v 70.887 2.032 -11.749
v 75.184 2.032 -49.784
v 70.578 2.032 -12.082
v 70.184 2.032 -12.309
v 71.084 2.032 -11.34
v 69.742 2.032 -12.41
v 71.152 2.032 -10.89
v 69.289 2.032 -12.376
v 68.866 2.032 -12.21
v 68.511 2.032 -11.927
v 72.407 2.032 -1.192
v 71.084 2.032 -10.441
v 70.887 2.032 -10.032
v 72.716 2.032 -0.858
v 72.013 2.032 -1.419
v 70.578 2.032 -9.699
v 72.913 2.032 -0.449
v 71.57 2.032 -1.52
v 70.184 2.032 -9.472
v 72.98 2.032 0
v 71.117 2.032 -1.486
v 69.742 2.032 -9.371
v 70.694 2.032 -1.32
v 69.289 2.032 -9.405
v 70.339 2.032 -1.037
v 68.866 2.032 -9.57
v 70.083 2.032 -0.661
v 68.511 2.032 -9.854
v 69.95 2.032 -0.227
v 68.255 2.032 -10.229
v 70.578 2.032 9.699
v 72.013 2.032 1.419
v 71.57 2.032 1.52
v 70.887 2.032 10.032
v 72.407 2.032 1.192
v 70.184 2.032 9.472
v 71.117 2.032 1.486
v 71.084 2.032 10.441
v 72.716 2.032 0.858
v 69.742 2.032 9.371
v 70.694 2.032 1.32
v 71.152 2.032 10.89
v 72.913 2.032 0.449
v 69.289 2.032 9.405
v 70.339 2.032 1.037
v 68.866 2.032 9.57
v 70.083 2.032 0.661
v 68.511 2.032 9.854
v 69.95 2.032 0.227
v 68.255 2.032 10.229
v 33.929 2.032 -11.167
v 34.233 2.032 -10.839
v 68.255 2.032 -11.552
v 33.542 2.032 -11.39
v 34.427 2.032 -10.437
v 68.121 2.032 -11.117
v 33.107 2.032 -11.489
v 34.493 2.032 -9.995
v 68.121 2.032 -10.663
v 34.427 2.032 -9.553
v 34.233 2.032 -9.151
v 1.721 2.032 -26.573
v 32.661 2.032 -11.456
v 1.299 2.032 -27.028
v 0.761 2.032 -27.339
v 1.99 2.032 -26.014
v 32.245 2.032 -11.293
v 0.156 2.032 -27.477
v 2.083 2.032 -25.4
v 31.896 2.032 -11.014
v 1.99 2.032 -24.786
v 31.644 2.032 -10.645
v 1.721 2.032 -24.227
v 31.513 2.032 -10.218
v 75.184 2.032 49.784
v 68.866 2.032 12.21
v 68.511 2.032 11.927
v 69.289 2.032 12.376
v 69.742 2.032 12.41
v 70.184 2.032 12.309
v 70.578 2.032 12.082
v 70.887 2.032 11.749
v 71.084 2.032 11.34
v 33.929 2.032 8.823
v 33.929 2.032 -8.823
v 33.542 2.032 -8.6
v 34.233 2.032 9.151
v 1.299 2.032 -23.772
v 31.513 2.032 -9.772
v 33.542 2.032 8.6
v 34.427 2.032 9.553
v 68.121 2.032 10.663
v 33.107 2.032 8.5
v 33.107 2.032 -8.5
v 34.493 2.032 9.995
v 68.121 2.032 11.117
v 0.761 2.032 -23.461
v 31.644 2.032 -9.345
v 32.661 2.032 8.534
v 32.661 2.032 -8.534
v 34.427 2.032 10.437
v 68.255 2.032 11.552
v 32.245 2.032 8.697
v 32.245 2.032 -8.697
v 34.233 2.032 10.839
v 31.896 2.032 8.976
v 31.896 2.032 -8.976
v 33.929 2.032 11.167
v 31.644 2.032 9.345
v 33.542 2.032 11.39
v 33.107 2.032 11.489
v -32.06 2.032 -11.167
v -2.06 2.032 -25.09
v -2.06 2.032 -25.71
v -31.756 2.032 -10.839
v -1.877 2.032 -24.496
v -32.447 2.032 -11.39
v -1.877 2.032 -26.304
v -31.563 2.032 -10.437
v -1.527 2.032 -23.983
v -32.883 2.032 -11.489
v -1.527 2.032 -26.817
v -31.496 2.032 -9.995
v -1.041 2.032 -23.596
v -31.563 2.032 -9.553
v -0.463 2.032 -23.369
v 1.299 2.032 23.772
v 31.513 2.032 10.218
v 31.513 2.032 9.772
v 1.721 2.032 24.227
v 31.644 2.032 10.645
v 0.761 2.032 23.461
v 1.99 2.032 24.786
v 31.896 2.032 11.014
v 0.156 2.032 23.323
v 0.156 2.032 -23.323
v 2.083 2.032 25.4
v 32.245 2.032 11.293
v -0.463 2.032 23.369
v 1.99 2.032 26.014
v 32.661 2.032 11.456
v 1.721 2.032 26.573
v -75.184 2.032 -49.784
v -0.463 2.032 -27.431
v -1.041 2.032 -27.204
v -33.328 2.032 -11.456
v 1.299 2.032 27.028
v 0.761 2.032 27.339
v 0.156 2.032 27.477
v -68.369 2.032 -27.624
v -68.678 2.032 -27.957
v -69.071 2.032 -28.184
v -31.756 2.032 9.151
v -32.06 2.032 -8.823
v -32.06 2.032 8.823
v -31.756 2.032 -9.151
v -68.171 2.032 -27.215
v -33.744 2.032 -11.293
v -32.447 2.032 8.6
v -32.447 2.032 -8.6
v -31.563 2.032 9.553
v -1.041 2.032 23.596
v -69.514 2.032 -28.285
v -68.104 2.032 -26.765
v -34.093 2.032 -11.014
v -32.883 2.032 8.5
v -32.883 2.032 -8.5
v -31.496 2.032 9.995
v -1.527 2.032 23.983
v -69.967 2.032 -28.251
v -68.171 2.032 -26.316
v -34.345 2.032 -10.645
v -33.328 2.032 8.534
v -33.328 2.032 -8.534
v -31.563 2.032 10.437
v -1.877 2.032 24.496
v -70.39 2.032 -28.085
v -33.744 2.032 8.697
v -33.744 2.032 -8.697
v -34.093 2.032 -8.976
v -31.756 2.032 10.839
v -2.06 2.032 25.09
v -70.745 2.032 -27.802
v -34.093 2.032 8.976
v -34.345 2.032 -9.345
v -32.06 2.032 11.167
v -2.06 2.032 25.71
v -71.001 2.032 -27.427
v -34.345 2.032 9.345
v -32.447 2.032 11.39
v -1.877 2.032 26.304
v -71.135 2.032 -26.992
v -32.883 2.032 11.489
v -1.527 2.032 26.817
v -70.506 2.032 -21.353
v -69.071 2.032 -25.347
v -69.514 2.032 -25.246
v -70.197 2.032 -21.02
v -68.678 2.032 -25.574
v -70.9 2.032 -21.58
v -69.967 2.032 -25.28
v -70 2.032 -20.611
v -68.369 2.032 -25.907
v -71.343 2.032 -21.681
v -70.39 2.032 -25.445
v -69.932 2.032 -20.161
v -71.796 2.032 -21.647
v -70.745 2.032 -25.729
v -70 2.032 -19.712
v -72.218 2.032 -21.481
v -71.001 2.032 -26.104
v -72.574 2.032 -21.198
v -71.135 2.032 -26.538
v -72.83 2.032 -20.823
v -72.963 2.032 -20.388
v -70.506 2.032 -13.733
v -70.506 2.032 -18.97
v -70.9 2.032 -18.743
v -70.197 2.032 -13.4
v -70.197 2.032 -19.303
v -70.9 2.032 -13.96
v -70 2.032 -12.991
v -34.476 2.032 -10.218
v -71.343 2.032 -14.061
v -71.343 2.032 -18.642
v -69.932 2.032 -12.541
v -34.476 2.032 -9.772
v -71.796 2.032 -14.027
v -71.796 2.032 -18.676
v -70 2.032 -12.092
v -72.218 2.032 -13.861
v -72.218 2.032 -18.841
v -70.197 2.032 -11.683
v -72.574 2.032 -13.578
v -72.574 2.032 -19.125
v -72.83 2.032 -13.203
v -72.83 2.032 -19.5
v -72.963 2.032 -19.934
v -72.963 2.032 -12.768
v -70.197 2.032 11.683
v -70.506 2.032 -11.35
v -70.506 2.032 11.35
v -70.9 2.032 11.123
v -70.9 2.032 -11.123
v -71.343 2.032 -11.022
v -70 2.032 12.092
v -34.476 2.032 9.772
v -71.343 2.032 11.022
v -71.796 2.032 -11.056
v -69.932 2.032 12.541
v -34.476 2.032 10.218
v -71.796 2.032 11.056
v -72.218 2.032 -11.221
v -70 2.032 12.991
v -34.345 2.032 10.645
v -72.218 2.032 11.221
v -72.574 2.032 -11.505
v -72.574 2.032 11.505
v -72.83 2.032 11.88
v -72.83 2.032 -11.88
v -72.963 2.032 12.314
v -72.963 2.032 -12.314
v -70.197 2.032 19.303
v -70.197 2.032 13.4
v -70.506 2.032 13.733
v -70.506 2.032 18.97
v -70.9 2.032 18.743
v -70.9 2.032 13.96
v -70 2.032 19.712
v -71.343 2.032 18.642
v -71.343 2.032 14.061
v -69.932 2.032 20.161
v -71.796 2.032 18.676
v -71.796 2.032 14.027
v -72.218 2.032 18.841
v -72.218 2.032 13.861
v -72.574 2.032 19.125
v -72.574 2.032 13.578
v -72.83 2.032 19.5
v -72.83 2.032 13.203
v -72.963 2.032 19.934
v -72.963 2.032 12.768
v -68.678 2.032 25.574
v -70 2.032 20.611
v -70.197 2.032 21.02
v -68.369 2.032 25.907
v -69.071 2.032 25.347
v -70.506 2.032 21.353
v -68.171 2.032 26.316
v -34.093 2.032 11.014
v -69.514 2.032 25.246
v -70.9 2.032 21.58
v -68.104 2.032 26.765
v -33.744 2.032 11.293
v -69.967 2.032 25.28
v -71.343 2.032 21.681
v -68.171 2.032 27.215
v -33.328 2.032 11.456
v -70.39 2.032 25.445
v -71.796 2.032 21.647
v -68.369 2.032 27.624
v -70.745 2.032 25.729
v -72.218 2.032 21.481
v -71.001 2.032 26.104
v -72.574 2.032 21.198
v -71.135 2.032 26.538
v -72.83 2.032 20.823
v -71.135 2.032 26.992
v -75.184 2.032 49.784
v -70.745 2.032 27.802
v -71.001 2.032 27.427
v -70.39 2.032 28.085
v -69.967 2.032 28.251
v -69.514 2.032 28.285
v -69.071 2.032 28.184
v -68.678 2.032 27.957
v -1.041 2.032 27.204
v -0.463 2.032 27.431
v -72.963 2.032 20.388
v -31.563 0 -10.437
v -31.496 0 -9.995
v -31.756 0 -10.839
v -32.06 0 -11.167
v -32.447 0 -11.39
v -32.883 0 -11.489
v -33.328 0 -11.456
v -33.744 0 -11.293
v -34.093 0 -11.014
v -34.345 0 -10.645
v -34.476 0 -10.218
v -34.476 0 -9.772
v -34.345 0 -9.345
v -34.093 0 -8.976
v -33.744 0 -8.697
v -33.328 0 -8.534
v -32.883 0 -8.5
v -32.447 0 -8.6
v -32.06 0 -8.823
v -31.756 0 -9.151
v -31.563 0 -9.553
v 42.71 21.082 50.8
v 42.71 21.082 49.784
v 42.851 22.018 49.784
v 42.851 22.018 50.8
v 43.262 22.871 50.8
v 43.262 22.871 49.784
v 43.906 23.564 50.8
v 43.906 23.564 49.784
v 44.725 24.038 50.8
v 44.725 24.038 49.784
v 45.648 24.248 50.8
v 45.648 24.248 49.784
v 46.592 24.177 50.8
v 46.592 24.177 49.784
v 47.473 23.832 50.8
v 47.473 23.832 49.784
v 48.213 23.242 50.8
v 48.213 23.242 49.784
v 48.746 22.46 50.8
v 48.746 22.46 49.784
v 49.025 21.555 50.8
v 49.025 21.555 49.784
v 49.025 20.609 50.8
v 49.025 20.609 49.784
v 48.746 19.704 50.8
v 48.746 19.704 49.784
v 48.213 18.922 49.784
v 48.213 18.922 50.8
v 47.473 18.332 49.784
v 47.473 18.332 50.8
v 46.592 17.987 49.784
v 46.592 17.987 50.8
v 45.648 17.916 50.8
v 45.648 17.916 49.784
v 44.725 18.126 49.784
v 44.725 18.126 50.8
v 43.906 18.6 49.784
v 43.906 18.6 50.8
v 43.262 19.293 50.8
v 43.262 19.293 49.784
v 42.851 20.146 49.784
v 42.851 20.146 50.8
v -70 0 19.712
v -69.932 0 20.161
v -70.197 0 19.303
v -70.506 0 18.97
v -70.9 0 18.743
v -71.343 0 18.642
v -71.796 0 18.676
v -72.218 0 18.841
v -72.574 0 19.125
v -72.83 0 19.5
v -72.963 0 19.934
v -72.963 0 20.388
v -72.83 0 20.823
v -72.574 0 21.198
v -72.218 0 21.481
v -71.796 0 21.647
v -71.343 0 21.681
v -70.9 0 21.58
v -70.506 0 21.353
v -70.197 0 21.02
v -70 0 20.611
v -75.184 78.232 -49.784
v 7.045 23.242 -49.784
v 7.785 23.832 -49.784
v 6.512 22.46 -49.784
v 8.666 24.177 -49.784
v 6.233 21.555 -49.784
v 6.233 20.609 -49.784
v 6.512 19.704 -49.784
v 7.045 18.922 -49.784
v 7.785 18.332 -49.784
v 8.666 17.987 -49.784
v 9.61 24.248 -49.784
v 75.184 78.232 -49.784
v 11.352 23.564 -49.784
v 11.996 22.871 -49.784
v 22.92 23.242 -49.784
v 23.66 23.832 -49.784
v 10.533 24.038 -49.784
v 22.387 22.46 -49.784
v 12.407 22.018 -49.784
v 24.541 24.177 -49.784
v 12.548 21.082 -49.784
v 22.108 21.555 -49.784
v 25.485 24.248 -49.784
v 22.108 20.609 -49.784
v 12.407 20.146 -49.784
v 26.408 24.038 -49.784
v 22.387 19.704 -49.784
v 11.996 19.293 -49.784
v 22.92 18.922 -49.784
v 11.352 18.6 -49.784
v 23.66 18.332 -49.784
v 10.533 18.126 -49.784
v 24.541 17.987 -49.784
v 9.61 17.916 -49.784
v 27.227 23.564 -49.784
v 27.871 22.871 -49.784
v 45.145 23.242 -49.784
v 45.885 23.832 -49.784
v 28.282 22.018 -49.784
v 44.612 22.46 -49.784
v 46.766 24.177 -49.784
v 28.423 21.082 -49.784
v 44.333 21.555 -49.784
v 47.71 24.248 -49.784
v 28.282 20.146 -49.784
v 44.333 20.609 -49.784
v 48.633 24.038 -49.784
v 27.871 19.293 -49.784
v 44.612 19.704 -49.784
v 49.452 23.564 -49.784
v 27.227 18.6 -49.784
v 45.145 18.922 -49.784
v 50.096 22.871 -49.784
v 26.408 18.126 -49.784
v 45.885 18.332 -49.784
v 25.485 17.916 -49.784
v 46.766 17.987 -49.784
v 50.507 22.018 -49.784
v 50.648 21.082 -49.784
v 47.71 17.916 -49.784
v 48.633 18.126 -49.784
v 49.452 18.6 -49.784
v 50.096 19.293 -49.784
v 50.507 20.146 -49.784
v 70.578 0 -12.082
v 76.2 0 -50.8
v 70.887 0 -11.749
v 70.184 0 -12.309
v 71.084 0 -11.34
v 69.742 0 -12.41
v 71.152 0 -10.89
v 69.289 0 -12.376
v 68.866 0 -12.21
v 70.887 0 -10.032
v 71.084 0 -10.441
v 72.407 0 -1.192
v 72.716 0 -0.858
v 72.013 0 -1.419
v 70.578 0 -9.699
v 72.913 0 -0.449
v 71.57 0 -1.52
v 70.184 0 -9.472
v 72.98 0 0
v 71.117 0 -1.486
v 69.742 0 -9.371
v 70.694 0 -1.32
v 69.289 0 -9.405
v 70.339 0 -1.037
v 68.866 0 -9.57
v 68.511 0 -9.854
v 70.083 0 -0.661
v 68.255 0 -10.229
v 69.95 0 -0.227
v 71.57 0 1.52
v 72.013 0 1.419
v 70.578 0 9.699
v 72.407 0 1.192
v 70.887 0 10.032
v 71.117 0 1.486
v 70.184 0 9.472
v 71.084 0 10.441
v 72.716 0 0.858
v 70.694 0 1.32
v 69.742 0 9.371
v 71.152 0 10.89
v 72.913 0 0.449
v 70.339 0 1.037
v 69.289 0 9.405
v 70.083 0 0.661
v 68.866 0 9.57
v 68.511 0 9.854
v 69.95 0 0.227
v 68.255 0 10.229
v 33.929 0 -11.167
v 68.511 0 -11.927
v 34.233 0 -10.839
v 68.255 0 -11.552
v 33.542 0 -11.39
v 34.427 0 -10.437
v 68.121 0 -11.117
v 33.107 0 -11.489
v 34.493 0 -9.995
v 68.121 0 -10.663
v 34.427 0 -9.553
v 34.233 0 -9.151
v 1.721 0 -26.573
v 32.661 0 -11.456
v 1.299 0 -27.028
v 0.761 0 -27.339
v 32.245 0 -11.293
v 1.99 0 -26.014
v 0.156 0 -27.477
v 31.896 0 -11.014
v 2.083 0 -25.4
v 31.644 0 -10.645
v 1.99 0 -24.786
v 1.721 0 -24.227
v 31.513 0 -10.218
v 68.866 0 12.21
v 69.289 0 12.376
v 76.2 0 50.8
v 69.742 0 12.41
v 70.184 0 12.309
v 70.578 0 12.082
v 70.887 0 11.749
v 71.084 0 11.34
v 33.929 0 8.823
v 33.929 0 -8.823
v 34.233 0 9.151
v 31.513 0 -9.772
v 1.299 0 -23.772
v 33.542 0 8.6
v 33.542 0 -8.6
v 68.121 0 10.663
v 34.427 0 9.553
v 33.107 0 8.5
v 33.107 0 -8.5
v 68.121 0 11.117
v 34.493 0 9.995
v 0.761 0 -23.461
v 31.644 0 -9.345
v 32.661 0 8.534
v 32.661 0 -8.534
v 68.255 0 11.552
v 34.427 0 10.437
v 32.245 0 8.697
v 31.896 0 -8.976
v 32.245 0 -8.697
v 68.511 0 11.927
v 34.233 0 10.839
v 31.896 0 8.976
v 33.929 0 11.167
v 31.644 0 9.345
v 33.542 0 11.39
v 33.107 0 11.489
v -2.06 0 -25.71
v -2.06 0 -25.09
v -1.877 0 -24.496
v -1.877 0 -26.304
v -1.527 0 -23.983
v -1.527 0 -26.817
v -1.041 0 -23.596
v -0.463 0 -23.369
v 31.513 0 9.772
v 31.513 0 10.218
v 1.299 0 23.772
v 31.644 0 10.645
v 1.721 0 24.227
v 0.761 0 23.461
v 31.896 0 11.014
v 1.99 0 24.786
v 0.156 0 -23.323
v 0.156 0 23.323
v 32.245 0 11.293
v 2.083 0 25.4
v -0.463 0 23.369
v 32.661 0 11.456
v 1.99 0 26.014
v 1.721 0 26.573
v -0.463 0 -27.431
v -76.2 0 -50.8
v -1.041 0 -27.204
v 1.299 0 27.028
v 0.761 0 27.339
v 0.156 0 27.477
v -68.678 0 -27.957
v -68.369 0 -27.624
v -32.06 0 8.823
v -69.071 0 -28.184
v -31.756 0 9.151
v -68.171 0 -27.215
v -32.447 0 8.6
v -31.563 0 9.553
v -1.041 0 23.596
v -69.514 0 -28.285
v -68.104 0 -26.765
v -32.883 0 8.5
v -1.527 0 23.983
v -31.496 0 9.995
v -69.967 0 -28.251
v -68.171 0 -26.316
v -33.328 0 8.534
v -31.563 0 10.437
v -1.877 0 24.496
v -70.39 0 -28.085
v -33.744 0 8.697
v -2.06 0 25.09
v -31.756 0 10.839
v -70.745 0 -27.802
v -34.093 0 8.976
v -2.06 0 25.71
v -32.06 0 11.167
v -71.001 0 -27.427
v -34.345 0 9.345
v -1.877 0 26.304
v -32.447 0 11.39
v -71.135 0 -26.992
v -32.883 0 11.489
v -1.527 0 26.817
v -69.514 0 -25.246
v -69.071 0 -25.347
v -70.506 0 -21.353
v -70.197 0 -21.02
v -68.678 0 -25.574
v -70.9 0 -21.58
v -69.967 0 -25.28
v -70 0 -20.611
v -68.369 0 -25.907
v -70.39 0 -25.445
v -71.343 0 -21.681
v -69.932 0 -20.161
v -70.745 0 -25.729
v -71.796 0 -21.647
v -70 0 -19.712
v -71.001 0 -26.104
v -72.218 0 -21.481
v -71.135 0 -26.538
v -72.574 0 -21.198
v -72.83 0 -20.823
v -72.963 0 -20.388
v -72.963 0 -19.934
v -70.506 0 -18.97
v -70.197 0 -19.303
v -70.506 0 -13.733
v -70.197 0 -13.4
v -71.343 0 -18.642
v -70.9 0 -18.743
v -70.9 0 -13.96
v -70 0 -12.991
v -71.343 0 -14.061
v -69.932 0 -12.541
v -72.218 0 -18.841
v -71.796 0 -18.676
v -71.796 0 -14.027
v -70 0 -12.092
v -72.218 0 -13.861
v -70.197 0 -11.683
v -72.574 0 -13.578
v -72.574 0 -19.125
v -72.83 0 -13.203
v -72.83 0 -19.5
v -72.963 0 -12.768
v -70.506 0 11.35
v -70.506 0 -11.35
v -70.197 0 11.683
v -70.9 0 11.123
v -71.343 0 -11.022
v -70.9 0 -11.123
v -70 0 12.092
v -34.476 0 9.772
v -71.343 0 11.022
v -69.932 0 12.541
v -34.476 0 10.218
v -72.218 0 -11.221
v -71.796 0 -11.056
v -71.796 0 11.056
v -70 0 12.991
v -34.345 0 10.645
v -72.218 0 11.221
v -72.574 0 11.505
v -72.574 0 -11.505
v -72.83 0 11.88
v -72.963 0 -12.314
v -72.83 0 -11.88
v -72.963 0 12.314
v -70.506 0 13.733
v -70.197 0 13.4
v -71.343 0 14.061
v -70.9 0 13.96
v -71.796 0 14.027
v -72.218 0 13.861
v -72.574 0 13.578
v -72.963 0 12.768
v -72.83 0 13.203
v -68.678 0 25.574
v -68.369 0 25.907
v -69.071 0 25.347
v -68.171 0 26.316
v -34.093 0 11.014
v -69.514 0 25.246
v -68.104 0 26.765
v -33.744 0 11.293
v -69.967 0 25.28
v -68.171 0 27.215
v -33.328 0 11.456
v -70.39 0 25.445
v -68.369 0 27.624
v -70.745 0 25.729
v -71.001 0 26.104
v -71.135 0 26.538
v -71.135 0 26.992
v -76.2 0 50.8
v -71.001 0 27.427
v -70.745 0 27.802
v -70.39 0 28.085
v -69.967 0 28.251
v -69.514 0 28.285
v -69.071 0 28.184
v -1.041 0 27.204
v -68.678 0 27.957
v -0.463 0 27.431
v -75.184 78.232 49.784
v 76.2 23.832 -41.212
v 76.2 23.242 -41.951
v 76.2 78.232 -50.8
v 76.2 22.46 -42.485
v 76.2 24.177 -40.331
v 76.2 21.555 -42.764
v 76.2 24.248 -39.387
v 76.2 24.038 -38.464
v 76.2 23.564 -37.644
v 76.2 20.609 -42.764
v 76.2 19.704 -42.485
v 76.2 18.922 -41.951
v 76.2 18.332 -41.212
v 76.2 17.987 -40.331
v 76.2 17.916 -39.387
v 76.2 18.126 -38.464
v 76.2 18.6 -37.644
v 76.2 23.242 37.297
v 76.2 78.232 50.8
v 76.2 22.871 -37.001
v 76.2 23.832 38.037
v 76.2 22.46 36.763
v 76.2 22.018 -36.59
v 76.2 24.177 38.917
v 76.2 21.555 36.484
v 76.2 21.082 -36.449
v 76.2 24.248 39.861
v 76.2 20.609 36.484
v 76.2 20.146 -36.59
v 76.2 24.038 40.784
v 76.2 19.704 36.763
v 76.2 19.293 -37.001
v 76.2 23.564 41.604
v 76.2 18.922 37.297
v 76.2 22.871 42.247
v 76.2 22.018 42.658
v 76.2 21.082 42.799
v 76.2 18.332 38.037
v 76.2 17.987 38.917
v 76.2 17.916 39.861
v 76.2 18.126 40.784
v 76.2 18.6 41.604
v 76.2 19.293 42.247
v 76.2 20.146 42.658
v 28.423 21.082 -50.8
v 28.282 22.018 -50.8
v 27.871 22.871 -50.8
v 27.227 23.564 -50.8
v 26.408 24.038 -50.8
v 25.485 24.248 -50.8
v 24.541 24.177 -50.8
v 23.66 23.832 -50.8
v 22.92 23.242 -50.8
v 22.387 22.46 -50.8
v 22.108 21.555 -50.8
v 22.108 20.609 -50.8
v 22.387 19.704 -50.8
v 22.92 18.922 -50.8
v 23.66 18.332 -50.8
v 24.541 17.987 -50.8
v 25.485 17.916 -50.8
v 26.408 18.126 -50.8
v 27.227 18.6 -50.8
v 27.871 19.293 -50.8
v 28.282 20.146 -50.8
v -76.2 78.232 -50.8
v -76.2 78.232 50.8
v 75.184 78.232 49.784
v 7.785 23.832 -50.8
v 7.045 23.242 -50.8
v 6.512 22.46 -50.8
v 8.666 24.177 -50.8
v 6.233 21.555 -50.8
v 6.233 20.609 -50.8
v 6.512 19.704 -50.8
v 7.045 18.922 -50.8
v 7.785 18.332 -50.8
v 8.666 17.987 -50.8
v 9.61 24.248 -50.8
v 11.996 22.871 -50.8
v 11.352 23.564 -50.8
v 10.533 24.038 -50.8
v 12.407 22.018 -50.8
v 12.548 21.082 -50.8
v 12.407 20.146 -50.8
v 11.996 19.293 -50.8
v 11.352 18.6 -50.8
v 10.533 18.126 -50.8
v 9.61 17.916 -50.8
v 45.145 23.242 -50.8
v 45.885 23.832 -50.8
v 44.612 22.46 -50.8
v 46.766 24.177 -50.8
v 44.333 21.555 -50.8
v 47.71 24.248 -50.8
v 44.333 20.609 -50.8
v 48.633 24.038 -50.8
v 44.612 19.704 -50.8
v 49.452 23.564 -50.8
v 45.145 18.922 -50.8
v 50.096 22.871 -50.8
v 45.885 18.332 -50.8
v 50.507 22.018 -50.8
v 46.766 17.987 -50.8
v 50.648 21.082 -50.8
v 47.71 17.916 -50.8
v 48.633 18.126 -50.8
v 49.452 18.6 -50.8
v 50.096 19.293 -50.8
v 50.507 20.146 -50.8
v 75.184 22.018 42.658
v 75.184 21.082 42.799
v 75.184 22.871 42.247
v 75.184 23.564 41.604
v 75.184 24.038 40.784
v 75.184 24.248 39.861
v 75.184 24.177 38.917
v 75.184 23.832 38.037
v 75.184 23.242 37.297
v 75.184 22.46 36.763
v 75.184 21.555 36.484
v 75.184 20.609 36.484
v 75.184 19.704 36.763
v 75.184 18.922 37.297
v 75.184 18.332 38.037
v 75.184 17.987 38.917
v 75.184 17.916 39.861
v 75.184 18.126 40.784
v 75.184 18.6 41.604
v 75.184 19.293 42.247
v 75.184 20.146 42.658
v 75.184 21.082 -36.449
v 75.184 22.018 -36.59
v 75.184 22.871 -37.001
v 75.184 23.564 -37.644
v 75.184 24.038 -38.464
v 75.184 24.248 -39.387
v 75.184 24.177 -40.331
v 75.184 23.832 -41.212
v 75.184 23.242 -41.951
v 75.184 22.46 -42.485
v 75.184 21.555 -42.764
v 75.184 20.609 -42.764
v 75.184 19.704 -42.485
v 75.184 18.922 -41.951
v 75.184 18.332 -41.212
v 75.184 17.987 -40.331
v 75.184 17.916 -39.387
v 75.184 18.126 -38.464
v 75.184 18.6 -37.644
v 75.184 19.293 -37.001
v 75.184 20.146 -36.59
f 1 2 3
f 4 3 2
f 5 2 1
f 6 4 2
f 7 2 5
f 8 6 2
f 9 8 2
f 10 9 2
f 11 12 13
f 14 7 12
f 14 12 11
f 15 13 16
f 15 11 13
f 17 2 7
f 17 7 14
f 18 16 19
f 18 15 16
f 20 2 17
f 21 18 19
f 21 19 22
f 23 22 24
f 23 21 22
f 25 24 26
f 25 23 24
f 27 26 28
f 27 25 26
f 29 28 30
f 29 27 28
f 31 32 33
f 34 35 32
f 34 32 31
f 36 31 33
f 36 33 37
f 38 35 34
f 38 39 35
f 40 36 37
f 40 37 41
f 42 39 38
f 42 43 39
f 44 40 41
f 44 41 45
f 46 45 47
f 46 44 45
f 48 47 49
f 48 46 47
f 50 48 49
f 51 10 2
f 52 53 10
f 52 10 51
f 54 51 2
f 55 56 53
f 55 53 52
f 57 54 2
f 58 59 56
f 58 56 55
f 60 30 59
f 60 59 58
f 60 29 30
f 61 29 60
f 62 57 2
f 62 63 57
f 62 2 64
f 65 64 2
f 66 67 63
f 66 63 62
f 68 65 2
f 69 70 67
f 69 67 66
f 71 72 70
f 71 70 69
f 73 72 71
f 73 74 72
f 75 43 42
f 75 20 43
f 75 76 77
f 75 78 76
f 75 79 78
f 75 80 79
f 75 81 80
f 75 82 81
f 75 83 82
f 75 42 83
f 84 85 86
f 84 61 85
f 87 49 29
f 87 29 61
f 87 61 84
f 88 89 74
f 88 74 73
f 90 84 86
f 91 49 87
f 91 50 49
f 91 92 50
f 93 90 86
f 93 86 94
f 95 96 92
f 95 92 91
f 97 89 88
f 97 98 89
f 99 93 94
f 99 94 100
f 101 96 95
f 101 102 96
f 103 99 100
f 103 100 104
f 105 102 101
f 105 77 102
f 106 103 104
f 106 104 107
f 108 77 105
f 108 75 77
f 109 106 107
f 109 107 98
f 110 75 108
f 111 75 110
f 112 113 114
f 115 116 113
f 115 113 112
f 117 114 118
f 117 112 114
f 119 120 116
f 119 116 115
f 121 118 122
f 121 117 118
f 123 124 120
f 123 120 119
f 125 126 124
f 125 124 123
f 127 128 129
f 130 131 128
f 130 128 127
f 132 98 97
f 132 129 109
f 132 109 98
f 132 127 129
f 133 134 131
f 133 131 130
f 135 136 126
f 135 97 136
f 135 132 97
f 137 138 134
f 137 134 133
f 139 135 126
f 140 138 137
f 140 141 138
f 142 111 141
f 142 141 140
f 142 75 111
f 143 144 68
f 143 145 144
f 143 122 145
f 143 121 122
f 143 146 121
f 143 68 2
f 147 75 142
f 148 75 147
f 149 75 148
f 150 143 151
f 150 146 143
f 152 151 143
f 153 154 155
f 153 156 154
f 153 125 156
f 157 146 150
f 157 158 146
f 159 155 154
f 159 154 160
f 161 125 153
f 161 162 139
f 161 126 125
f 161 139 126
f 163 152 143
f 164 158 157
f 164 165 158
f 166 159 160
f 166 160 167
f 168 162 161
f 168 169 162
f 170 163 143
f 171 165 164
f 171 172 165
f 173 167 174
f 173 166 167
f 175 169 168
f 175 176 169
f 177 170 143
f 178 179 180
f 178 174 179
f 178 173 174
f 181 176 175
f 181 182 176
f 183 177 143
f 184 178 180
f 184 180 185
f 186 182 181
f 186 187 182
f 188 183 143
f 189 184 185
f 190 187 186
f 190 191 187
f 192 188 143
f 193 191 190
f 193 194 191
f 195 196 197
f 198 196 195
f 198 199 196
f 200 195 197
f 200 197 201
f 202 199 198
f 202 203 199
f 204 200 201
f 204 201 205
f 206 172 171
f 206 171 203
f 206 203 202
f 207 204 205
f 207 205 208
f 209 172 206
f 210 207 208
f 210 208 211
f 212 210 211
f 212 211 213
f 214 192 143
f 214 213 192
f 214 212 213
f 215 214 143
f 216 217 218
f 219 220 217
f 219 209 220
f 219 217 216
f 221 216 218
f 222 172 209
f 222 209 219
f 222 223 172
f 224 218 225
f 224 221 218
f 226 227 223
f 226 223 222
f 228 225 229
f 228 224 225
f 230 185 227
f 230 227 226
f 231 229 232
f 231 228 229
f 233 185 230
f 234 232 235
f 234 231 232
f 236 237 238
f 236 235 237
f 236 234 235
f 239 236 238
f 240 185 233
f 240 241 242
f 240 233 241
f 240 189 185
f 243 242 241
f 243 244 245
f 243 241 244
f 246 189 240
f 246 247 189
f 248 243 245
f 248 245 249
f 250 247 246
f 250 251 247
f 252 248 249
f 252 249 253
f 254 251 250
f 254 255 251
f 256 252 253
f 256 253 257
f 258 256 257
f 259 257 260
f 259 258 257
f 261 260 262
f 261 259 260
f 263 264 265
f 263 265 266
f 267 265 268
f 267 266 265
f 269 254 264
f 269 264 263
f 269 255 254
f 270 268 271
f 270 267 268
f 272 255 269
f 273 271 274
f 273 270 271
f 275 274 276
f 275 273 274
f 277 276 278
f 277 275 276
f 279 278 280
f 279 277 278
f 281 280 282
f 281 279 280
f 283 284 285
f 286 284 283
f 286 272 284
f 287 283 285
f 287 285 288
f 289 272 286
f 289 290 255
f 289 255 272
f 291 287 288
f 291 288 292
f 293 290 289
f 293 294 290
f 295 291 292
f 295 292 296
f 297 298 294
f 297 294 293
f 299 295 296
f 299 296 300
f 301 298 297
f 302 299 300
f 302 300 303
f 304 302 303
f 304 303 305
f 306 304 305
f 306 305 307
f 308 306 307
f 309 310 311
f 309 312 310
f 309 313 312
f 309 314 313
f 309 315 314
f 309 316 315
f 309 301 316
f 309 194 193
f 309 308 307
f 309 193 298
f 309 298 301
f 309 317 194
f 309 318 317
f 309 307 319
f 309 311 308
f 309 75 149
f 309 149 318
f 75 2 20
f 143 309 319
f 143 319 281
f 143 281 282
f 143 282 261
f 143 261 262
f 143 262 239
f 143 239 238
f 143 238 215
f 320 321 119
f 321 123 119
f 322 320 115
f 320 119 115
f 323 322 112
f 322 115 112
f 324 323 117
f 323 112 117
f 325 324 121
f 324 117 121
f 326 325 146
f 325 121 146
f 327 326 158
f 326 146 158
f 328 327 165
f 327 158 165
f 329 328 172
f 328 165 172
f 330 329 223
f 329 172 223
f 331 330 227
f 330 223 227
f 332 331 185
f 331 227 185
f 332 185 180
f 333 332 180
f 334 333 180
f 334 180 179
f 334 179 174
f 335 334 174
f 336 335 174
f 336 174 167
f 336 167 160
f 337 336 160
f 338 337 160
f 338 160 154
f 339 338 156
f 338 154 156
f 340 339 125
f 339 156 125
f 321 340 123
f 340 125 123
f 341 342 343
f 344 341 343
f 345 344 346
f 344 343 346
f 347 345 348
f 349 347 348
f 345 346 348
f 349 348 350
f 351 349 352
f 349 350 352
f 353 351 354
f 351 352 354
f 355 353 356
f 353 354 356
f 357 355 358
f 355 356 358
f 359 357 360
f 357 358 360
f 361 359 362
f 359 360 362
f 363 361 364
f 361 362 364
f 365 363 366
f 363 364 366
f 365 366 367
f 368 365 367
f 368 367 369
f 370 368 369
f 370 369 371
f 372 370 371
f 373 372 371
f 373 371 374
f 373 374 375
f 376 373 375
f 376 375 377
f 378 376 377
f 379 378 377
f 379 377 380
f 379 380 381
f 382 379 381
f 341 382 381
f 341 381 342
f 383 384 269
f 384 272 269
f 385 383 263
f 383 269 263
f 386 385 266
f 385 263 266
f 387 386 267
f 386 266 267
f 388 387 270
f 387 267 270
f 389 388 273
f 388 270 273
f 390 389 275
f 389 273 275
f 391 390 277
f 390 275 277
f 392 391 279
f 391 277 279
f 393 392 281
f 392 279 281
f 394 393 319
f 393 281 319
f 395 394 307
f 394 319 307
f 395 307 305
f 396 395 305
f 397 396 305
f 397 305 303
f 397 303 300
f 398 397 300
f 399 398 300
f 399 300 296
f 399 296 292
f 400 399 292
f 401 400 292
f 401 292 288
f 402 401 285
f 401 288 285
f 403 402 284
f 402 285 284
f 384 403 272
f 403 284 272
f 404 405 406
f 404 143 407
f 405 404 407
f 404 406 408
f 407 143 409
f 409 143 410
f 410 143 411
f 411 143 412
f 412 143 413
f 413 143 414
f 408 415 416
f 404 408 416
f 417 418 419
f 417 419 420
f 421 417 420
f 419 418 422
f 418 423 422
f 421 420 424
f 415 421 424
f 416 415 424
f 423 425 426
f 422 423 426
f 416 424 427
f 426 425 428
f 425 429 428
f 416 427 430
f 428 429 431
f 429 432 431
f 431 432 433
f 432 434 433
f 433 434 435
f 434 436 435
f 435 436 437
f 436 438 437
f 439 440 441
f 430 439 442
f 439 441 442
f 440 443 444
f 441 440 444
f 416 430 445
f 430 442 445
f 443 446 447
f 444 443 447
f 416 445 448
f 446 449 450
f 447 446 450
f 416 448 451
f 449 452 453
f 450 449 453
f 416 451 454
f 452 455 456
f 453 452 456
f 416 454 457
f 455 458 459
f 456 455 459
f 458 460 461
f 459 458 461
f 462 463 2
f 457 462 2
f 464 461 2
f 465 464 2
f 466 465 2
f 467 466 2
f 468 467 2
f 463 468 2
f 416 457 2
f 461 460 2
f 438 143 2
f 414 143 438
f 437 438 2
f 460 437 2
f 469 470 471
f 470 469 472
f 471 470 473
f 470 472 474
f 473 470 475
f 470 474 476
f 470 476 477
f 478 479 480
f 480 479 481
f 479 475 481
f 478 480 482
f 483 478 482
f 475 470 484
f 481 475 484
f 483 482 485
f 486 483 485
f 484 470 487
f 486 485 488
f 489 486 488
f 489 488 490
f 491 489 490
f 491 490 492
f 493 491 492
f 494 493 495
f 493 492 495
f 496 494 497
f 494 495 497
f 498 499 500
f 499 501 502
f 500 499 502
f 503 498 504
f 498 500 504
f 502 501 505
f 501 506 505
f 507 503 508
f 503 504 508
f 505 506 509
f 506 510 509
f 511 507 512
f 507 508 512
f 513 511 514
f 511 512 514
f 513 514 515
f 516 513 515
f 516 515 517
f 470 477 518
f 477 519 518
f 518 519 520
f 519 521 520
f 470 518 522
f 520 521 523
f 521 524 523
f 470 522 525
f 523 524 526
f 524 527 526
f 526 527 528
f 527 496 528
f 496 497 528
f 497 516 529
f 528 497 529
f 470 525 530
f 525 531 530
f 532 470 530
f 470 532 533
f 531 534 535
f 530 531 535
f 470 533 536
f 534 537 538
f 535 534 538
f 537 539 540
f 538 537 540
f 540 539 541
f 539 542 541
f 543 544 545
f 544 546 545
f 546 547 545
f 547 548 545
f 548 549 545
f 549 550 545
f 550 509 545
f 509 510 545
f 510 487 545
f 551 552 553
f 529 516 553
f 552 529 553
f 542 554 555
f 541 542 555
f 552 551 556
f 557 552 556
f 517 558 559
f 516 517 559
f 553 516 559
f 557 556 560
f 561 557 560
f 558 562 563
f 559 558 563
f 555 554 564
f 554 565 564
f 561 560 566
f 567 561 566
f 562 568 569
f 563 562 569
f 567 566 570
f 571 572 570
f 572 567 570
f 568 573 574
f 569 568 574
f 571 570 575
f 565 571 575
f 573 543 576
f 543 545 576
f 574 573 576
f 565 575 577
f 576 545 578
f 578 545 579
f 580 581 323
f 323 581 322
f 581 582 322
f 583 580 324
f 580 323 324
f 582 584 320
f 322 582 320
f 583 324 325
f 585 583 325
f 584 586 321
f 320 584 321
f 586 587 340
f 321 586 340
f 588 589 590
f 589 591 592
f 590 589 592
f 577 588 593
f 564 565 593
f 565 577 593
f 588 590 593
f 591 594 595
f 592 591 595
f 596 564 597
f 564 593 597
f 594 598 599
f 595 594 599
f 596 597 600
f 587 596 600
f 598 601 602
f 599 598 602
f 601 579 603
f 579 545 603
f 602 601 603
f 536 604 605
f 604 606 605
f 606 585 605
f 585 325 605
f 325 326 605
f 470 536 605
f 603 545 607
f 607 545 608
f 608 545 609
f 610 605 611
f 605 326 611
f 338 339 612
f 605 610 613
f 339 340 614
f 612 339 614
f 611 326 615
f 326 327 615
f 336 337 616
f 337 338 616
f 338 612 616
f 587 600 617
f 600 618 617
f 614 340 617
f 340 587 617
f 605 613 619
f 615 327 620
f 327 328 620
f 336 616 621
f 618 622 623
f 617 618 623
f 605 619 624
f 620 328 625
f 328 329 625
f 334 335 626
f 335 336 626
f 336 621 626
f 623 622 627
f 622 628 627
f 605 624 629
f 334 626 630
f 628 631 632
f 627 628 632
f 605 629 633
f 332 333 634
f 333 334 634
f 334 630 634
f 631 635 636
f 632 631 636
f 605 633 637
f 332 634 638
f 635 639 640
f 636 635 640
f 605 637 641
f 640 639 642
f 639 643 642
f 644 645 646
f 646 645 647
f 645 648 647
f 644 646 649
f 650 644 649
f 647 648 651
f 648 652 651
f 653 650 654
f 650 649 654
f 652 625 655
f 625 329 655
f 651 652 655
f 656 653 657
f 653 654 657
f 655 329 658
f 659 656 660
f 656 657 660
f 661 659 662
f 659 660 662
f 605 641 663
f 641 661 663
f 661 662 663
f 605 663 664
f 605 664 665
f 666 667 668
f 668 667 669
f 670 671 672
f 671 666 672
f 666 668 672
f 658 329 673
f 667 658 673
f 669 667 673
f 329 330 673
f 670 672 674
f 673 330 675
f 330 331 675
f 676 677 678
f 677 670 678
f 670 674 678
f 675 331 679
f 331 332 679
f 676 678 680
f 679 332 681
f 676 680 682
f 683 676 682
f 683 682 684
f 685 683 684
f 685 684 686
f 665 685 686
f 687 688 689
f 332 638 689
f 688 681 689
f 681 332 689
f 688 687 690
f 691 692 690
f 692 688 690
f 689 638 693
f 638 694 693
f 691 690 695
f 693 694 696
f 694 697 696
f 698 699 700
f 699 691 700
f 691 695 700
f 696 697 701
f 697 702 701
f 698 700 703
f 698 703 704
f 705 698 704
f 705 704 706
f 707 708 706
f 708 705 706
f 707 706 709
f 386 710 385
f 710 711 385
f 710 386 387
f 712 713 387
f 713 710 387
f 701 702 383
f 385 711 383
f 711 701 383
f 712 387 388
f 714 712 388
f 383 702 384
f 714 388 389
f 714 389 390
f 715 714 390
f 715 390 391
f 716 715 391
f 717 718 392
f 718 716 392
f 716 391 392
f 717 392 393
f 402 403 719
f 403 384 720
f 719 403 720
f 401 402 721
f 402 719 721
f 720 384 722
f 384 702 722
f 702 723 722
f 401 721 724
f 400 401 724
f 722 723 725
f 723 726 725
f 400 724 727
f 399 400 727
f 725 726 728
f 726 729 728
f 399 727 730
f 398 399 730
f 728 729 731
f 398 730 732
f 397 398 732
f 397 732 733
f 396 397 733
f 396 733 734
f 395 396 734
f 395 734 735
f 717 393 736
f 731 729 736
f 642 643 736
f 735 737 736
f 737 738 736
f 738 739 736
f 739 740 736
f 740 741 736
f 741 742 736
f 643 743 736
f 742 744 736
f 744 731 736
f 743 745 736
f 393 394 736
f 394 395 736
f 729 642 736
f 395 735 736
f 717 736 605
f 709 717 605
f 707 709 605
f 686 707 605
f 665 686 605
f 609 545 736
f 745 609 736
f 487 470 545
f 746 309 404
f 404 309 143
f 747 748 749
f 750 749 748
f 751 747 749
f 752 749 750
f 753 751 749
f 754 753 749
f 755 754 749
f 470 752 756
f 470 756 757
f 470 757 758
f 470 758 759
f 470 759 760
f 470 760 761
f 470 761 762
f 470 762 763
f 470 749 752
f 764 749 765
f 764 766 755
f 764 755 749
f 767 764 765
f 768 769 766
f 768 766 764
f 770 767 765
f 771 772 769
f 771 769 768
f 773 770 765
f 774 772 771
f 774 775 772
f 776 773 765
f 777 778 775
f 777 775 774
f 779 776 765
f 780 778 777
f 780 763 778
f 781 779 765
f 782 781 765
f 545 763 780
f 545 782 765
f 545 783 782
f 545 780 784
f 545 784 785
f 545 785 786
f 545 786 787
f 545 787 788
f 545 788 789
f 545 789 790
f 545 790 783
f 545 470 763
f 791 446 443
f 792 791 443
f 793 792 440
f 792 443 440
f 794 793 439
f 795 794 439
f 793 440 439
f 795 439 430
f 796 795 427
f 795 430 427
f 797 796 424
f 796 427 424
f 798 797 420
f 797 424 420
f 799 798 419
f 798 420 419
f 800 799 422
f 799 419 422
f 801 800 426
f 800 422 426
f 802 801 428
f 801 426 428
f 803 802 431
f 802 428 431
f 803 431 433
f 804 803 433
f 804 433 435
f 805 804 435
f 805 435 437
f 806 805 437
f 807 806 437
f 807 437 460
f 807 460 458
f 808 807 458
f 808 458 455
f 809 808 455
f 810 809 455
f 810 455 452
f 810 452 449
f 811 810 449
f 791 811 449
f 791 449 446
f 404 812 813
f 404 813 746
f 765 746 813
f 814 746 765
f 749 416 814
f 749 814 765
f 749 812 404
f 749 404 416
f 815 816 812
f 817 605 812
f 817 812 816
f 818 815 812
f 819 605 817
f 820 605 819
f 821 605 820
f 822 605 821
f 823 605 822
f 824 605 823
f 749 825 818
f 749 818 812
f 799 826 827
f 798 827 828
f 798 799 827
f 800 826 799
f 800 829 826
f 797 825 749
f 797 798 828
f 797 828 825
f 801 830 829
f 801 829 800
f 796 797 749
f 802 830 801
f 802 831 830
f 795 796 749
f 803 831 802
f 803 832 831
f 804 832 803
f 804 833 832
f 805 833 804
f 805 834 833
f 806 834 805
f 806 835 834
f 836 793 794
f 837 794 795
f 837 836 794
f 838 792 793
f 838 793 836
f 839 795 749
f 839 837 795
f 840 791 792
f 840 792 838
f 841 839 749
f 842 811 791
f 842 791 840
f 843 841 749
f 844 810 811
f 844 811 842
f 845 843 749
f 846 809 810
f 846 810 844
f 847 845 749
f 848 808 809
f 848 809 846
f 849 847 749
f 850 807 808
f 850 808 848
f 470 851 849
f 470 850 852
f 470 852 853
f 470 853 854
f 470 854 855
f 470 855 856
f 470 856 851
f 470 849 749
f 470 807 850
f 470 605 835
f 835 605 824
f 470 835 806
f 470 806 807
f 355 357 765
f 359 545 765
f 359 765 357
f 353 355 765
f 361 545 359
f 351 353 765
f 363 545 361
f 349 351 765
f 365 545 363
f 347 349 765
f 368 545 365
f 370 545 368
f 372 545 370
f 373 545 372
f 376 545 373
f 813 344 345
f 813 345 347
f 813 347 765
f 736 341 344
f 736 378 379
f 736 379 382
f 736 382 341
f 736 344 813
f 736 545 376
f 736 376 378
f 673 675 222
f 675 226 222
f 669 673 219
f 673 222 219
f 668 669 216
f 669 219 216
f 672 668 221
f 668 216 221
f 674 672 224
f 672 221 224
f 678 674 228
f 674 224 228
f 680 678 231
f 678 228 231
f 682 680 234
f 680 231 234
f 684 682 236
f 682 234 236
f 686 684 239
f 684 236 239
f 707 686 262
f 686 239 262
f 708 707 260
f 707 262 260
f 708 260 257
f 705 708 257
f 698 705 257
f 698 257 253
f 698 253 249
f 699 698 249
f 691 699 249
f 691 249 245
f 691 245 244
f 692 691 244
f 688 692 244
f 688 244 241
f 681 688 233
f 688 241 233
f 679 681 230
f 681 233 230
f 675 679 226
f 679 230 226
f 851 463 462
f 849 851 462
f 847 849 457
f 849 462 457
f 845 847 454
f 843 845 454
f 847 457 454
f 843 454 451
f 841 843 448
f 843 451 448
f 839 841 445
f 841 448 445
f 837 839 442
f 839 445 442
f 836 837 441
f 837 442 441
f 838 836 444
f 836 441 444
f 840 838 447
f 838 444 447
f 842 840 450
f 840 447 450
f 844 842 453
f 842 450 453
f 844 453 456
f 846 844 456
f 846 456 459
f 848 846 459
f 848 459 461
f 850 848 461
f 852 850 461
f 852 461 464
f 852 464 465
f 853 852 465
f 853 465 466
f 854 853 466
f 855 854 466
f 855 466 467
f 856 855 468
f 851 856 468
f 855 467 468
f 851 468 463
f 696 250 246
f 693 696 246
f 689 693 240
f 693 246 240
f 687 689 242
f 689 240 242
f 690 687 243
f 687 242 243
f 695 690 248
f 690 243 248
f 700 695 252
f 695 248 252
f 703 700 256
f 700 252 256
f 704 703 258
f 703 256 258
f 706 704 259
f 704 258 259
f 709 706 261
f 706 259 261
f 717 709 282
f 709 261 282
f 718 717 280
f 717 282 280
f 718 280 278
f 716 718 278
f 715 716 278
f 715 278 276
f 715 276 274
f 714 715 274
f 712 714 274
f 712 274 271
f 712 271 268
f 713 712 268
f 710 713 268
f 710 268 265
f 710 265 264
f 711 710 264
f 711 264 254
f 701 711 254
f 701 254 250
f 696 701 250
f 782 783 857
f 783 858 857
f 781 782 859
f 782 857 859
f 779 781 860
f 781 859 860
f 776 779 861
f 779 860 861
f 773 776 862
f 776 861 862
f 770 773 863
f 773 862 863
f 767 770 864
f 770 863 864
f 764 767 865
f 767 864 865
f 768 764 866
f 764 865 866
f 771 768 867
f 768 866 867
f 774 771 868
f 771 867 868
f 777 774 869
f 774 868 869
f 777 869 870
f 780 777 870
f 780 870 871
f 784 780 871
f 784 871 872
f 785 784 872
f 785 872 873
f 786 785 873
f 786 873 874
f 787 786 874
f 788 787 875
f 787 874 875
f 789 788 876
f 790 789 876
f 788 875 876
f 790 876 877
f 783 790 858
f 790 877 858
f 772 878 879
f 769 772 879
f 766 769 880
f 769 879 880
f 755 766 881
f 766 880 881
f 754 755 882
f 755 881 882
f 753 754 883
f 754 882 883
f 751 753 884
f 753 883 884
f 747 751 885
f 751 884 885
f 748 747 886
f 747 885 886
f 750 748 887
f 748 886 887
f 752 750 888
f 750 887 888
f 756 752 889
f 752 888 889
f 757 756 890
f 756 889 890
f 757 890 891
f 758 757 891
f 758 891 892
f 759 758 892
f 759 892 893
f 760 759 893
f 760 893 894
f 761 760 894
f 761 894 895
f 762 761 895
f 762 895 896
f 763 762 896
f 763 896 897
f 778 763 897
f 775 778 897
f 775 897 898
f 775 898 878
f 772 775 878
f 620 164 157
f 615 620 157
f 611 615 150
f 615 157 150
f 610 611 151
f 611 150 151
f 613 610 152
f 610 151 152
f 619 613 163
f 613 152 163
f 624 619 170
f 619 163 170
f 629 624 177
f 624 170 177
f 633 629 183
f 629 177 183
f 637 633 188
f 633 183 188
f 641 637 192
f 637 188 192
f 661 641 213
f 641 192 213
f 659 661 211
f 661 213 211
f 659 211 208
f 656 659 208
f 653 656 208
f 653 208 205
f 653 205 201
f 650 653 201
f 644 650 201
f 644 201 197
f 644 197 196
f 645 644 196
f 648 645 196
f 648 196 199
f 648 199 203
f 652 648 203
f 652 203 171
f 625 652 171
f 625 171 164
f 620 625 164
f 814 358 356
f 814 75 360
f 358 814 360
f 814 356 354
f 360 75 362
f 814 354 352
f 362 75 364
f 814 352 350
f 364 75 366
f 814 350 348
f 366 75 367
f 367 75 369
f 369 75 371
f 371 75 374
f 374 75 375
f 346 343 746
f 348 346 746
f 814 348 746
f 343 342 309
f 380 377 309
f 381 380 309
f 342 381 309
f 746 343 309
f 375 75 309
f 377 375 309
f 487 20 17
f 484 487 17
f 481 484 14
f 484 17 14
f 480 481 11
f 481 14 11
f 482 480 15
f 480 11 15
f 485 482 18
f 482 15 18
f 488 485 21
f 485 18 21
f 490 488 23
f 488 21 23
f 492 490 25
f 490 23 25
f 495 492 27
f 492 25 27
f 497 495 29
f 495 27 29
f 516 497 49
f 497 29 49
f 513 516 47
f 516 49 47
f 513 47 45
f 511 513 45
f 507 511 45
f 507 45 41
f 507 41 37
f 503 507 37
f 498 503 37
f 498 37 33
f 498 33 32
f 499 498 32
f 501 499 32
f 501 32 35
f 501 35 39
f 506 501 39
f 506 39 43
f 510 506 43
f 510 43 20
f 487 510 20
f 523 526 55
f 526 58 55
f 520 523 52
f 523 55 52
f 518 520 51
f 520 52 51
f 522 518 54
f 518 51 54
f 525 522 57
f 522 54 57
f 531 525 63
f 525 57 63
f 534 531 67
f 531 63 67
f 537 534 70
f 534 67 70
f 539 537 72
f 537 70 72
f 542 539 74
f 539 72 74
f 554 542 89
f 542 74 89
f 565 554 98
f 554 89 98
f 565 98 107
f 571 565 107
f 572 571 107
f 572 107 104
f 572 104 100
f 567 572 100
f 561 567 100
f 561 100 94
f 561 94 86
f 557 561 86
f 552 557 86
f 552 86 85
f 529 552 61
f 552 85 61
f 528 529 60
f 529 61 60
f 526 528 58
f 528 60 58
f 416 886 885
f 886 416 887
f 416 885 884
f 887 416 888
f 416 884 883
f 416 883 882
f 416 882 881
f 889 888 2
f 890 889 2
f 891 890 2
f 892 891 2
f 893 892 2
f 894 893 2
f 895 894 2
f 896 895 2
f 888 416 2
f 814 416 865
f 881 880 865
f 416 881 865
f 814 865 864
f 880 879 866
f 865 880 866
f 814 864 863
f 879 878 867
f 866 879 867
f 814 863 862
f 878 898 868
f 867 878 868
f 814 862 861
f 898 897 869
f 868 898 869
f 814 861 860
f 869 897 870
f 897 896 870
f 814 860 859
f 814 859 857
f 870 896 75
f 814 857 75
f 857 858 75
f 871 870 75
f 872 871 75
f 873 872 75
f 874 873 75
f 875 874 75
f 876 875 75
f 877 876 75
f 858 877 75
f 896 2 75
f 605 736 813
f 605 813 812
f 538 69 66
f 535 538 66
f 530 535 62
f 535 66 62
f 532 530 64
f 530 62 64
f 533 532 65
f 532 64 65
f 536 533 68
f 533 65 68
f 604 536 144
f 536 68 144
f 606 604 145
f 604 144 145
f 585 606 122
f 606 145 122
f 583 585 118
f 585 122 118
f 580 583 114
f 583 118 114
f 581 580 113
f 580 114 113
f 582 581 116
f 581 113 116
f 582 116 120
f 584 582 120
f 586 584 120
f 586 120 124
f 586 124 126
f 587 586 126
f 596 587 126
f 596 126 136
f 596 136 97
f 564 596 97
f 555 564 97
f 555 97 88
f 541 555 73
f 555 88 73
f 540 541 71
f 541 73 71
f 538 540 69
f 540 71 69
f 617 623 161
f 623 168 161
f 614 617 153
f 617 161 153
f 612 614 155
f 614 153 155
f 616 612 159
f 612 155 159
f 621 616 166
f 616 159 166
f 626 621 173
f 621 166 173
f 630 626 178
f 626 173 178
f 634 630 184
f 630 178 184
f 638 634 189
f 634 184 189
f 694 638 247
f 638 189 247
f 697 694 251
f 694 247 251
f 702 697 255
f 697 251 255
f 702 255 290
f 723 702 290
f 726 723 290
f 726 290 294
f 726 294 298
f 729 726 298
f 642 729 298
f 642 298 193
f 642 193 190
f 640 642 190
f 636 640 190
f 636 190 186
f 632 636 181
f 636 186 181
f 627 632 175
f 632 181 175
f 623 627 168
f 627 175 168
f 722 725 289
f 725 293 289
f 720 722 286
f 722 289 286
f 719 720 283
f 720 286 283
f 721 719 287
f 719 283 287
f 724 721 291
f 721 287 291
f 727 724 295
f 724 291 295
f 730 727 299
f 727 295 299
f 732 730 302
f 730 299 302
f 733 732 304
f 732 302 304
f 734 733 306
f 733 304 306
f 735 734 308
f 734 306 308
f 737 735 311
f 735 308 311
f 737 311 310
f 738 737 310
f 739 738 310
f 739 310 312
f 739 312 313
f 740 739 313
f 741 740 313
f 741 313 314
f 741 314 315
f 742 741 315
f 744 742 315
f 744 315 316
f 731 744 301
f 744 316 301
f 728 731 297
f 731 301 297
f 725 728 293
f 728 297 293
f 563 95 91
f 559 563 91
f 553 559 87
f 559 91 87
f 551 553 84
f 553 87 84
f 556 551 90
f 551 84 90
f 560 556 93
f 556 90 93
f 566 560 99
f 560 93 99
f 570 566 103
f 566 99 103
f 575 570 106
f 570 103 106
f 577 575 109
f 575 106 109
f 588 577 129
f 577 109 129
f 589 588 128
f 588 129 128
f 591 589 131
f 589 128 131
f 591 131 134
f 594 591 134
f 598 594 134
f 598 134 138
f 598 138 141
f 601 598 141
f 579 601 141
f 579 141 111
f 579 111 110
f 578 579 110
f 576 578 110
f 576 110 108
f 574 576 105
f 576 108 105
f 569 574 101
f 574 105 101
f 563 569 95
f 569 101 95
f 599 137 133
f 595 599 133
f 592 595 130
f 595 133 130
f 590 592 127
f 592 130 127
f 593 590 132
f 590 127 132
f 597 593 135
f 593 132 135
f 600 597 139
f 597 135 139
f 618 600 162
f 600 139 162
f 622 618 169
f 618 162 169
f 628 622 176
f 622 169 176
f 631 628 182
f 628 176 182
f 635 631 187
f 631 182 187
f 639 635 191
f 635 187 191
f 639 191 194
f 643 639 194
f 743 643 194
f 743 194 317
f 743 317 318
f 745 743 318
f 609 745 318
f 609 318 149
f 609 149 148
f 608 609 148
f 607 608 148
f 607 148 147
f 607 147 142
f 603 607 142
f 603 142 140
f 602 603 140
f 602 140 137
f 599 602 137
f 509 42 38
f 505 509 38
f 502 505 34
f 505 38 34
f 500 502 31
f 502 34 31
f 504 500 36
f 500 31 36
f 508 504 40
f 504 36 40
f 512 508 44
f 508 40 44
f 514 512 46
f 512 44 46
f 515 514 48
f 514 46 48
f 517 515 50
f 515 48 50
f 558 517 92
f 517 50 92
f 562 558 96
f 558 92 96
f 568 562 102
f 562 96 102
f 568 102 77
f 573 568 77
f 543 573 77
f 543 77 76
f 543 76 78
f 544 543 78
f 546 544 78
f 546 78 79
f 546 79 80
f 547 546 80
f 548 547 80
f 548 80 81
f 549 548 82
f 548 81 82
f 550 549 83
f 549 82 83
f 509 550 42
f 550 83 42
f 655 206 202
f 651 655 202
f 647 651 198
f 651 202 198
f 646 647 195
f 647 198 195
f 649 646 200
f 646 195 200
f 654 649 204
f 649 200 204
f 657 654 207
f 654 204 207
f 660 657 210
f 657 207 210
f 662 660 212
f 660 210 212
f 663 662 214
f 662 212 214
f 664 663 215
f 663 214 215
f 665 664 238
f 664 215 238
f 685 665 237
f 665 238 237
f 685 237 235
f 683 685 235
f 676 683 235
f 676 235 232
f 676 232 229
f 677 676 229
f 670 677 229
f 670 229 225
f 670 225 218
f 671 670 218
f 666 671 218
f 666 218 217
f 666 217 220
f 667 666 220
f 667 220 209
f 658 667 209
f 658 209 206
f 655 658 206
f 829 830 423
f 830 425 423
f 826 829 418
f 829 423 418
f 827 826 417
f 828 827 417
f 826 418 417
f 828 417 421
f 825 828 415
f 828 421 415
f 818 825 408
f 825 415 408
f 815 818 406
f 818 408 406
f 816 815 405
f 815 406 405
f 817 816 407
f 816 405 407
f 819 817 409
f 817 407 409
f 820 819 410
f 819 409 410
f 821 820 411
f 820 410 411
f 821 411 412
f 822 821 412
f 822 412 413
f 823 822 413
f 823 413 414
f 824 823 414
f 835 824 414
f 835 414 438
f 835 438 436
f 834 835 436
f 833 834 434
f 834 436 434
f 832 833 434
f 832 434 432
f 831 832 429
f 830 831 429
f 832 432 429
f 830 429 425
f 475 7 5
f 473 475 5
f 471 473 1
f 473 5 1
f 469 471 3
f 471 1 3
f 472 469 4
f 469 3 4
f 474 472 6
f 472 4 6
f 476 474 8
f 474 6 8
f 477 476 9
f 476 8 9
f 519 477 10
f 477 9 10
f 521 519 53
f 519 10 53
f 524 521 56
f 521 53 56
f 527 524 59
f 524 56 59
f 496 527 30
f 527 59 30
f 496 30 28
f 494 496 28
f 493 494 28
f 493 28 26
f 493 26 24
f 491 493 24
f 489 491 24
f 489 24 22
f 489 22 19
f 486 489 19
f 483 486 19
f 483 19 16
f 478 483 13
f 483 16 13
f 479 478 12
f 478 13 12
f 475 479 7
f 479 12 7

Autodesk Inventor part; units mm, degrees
ref_plane "YZ Plane" through (0, 0, 0) normal (1, 0, 0) x (0, 1, 0)
ref_plane "XZ Plane" through (0, 0, 0) normal (0, 1, 0) x (-1, 0, 0)
ref_plane "XY Plane" through (0, 0, 0) normal (0, 0, 1) x (1, 0, 0)
sketch "Sketch1" plane through (0, 0, 0) normal (0, 1, 0) x (-1, 0, 0)
  line L0 (-76.2, 50.8) -> (76.2, 50.8)
  line L1 (76.2, 50.8) -> (76.2, -50.8)
  line L2 (76.2, -50.8) -> (-76.2, -50.8)
  line L3 (-76.2, -50.8) -> (-76.2, 50.8)
  line L4 (-76.2, 50.8) -> (76.2, -50.8) construction
  line L5 (76.2, 50.8) -> (-76.2, -50.8) construction
  point P0 (0, 0)
  dimension "d0" = 152.4
  dimension "d1" = 101.6
extrude "Extrusion1" add sketch "Sketch1" along normal blind 2.032
sketch "Sketch2" plane through (0, 2.032, 0) normal (0, 1, 0) x (1, 0, 0)
  line L0 (-76.2, -50.8) -> (76.2, -50.8) projected
  line L1 (76.2, -50.8) -> (76.2, 50.8) projected
  line L2 (-76.2, -50.8) -> (76.2, -50.8)
  line L3 (76.2, -50.8) -> (76.2, 50.8)
  line L4 (76.2, 50.8) -> (-76.2, 50.8)
  line L5 (-76.2, 50.8) -> (-76.2, -50.8)
  line L6 (75.184, -49.784) -> (-75.184, -49.784)
  line L7 (-75.184, -49.784) -> (-75.184, 49.784)
  line L8 (-75.184, 49.784) -> (75.184, 49.784)
  line L9 (75.184, 49.784) -> (75.184, -49.784)
  line L10 (75.184, -49.784) -> (-75.184, 49.784) construction
  line L11 (-75.184, -49.784) -> (75.184, 49.784) construction
  point P0 (0, 0)
  dimension "d4" = 150.368
  dimension "d5" = 99.568
extrude "Extrusion2" add sketch "Sketch2" along normal blind 76.2
sketch "Sketch3" plane through (0, 2.032, 0) normal (0, 1, 0) x (1, 0, 0)
  circle A0 centre (0, -25.4) radius 2.0828
  circle A1 centre (0, 25.4) radius 2.0828
  point P0 (0, 0)
  dimension "d10" = 4.1656
  dimension "d11" = 4.1656
extrude "Extrusion3" cut sketch "Sketch3" against normal through all
sketch "Sketch4" plane through (0, 2.032, 0) normal (0, 1, 0) x (1, 0, 0)
  line L0 (32.9946, -9.9949) -> (-32.9946, 9.9949) construction
  line L1 (-32.9946, -9.9949) -> (32.9946, 9.9949) construction
  circle A0 centre (-32.9946, -9.9949) radius 1.4986
  circle A1 centre (-32.9946, 9.9949) radius 1.4986
  circle A2 centre (32.9946, 9.9949) radius 1.4986
  circle A3 centre (32.9946, -9.9949) radius 1.4986
  line L2 (-70.0024, -27.7812) -> (70.0024, 27.7812) construction
  line L3 (70.0024, -27.7812) -> (-70.0024, 27.7812) construction
  line L4 (70.6437, -27.7812) -> (-70.6437, 27.7812) construction
  line L5 (-70.6437, -27.7812) -> (70.6437, 27.7812) construction
  line L6 (70.6437, -27.7812) -> (86.5188, -27.7812) construction
  circle A4 centre (-71.4565, 20.1613) radius 1.524
  circle A5 centre (-71.4565, 12.5413) radius 1.524
  circle A6 centre (-71.4565, -12.5413) radius 1.524
  circle A7 centre (-71.4565, -20.1613) radius 1.524
  circle A8 centre (-69.6277, -26.7653) radius 1.524
  circle A9 centre (-69.6277, 26.7653) radius 1.524
  circle A10 centre (69.6277, -10.8903) radius 1.524
  circle A11 centre (71.4565, 0) radius 1.524
  circle A12 centre (69.6277, 10.8903) radius 1.524
  point P0 (0, 0)
  point P1 (0, 0)
  dimension "d14" = 65.9892
  dimension "d15" = 19.9898
  dimension "d16" = 2.9972
  dimension "d17" = 2.9972
  dimension "d18" = 2.9972
  dimension "d19" = 2.9972
  dimension "d21" = 55.5625
  dimension "d62" = 141.2875
  dimension "d63" = 55.5625
  dimension "d96" = 3.048
  dimension "d97" = 3.048
  dimension "d98" = 3.048
  dimension "d99" = 3.048
  dimension "d103" = 3.048
  dimension "d106" = 3.048
  dimension "d111" = 3.048
  dimension "d112" = 3.048
  dimension "d113" = 3.048
sketch "Sketch5" plane through (-75.184, 2.032, -49.784) normal (0, 0, 1) x (1, 0, 0)
  line L0 (151.384, 76.2) -> (-1.016, 76.2) projected
  line L1 (0.0002, 76.2) -> (150.368, 76.2)
  line L2 (150.368, 76.2) -> (150.368, 0)
  line L3 (150.368, 0) -> (0.0002, 0)
  line L4 (0.0002, 0) -> (0.0002, 76.2)
  circle A0 centre (84.5566, 19.05) radius 3.175
  circle A1 centre (100.4316, 19.05) radius 3.175
  circle A2 centre (122.6566, 19.05) radius 3.175
  point P0 (75.184, -2.032)
  dimension "d39" = 6.35
  dimension "d40" = 6.35
  dimension "d41" = 6.35
extrude "Extrusion5" cut sketch "Sketch5" against normal through all contours A0 | A1 | A2
sketch "Sketch6" plane through (75.184, 2.032, -49.784) normal (-1, 0, 0) x (0, 0, 1)
  circle A0 centre (10.16, 19.05) radius 3.175
  circle A1 centre (89.408, 19.05) radius 3.175
  point P0 (49.784, -2.032)
  dimension "d44" = 6.35
  dimension "d45" = 6.35
extrude "Extrusion6" cut sketch "Sketch6" against normal through all
sketch "Sketch7" plane through (75.184, 2.032, 49.784) normal (0, 0, -1) x (-1, 0, 0)
  line L0 (150.368, 0) -> (150.368, 76.2) projected
  line L1 (150.368, 19.05) -> (155.5496, 19.05) construction
  circle A0 centre (29.2989, 19.05) radius 3.175
  point P0 (75.184, -2.032)
  dimension "d51" = 6.35
extrude "Extrusion7" cut sketch "Sketch7" against normal through all
extrude "Extrusion8" cut sketch "Sketch4" against normal through all
properties part number "546-1444-8-ADF4355"
